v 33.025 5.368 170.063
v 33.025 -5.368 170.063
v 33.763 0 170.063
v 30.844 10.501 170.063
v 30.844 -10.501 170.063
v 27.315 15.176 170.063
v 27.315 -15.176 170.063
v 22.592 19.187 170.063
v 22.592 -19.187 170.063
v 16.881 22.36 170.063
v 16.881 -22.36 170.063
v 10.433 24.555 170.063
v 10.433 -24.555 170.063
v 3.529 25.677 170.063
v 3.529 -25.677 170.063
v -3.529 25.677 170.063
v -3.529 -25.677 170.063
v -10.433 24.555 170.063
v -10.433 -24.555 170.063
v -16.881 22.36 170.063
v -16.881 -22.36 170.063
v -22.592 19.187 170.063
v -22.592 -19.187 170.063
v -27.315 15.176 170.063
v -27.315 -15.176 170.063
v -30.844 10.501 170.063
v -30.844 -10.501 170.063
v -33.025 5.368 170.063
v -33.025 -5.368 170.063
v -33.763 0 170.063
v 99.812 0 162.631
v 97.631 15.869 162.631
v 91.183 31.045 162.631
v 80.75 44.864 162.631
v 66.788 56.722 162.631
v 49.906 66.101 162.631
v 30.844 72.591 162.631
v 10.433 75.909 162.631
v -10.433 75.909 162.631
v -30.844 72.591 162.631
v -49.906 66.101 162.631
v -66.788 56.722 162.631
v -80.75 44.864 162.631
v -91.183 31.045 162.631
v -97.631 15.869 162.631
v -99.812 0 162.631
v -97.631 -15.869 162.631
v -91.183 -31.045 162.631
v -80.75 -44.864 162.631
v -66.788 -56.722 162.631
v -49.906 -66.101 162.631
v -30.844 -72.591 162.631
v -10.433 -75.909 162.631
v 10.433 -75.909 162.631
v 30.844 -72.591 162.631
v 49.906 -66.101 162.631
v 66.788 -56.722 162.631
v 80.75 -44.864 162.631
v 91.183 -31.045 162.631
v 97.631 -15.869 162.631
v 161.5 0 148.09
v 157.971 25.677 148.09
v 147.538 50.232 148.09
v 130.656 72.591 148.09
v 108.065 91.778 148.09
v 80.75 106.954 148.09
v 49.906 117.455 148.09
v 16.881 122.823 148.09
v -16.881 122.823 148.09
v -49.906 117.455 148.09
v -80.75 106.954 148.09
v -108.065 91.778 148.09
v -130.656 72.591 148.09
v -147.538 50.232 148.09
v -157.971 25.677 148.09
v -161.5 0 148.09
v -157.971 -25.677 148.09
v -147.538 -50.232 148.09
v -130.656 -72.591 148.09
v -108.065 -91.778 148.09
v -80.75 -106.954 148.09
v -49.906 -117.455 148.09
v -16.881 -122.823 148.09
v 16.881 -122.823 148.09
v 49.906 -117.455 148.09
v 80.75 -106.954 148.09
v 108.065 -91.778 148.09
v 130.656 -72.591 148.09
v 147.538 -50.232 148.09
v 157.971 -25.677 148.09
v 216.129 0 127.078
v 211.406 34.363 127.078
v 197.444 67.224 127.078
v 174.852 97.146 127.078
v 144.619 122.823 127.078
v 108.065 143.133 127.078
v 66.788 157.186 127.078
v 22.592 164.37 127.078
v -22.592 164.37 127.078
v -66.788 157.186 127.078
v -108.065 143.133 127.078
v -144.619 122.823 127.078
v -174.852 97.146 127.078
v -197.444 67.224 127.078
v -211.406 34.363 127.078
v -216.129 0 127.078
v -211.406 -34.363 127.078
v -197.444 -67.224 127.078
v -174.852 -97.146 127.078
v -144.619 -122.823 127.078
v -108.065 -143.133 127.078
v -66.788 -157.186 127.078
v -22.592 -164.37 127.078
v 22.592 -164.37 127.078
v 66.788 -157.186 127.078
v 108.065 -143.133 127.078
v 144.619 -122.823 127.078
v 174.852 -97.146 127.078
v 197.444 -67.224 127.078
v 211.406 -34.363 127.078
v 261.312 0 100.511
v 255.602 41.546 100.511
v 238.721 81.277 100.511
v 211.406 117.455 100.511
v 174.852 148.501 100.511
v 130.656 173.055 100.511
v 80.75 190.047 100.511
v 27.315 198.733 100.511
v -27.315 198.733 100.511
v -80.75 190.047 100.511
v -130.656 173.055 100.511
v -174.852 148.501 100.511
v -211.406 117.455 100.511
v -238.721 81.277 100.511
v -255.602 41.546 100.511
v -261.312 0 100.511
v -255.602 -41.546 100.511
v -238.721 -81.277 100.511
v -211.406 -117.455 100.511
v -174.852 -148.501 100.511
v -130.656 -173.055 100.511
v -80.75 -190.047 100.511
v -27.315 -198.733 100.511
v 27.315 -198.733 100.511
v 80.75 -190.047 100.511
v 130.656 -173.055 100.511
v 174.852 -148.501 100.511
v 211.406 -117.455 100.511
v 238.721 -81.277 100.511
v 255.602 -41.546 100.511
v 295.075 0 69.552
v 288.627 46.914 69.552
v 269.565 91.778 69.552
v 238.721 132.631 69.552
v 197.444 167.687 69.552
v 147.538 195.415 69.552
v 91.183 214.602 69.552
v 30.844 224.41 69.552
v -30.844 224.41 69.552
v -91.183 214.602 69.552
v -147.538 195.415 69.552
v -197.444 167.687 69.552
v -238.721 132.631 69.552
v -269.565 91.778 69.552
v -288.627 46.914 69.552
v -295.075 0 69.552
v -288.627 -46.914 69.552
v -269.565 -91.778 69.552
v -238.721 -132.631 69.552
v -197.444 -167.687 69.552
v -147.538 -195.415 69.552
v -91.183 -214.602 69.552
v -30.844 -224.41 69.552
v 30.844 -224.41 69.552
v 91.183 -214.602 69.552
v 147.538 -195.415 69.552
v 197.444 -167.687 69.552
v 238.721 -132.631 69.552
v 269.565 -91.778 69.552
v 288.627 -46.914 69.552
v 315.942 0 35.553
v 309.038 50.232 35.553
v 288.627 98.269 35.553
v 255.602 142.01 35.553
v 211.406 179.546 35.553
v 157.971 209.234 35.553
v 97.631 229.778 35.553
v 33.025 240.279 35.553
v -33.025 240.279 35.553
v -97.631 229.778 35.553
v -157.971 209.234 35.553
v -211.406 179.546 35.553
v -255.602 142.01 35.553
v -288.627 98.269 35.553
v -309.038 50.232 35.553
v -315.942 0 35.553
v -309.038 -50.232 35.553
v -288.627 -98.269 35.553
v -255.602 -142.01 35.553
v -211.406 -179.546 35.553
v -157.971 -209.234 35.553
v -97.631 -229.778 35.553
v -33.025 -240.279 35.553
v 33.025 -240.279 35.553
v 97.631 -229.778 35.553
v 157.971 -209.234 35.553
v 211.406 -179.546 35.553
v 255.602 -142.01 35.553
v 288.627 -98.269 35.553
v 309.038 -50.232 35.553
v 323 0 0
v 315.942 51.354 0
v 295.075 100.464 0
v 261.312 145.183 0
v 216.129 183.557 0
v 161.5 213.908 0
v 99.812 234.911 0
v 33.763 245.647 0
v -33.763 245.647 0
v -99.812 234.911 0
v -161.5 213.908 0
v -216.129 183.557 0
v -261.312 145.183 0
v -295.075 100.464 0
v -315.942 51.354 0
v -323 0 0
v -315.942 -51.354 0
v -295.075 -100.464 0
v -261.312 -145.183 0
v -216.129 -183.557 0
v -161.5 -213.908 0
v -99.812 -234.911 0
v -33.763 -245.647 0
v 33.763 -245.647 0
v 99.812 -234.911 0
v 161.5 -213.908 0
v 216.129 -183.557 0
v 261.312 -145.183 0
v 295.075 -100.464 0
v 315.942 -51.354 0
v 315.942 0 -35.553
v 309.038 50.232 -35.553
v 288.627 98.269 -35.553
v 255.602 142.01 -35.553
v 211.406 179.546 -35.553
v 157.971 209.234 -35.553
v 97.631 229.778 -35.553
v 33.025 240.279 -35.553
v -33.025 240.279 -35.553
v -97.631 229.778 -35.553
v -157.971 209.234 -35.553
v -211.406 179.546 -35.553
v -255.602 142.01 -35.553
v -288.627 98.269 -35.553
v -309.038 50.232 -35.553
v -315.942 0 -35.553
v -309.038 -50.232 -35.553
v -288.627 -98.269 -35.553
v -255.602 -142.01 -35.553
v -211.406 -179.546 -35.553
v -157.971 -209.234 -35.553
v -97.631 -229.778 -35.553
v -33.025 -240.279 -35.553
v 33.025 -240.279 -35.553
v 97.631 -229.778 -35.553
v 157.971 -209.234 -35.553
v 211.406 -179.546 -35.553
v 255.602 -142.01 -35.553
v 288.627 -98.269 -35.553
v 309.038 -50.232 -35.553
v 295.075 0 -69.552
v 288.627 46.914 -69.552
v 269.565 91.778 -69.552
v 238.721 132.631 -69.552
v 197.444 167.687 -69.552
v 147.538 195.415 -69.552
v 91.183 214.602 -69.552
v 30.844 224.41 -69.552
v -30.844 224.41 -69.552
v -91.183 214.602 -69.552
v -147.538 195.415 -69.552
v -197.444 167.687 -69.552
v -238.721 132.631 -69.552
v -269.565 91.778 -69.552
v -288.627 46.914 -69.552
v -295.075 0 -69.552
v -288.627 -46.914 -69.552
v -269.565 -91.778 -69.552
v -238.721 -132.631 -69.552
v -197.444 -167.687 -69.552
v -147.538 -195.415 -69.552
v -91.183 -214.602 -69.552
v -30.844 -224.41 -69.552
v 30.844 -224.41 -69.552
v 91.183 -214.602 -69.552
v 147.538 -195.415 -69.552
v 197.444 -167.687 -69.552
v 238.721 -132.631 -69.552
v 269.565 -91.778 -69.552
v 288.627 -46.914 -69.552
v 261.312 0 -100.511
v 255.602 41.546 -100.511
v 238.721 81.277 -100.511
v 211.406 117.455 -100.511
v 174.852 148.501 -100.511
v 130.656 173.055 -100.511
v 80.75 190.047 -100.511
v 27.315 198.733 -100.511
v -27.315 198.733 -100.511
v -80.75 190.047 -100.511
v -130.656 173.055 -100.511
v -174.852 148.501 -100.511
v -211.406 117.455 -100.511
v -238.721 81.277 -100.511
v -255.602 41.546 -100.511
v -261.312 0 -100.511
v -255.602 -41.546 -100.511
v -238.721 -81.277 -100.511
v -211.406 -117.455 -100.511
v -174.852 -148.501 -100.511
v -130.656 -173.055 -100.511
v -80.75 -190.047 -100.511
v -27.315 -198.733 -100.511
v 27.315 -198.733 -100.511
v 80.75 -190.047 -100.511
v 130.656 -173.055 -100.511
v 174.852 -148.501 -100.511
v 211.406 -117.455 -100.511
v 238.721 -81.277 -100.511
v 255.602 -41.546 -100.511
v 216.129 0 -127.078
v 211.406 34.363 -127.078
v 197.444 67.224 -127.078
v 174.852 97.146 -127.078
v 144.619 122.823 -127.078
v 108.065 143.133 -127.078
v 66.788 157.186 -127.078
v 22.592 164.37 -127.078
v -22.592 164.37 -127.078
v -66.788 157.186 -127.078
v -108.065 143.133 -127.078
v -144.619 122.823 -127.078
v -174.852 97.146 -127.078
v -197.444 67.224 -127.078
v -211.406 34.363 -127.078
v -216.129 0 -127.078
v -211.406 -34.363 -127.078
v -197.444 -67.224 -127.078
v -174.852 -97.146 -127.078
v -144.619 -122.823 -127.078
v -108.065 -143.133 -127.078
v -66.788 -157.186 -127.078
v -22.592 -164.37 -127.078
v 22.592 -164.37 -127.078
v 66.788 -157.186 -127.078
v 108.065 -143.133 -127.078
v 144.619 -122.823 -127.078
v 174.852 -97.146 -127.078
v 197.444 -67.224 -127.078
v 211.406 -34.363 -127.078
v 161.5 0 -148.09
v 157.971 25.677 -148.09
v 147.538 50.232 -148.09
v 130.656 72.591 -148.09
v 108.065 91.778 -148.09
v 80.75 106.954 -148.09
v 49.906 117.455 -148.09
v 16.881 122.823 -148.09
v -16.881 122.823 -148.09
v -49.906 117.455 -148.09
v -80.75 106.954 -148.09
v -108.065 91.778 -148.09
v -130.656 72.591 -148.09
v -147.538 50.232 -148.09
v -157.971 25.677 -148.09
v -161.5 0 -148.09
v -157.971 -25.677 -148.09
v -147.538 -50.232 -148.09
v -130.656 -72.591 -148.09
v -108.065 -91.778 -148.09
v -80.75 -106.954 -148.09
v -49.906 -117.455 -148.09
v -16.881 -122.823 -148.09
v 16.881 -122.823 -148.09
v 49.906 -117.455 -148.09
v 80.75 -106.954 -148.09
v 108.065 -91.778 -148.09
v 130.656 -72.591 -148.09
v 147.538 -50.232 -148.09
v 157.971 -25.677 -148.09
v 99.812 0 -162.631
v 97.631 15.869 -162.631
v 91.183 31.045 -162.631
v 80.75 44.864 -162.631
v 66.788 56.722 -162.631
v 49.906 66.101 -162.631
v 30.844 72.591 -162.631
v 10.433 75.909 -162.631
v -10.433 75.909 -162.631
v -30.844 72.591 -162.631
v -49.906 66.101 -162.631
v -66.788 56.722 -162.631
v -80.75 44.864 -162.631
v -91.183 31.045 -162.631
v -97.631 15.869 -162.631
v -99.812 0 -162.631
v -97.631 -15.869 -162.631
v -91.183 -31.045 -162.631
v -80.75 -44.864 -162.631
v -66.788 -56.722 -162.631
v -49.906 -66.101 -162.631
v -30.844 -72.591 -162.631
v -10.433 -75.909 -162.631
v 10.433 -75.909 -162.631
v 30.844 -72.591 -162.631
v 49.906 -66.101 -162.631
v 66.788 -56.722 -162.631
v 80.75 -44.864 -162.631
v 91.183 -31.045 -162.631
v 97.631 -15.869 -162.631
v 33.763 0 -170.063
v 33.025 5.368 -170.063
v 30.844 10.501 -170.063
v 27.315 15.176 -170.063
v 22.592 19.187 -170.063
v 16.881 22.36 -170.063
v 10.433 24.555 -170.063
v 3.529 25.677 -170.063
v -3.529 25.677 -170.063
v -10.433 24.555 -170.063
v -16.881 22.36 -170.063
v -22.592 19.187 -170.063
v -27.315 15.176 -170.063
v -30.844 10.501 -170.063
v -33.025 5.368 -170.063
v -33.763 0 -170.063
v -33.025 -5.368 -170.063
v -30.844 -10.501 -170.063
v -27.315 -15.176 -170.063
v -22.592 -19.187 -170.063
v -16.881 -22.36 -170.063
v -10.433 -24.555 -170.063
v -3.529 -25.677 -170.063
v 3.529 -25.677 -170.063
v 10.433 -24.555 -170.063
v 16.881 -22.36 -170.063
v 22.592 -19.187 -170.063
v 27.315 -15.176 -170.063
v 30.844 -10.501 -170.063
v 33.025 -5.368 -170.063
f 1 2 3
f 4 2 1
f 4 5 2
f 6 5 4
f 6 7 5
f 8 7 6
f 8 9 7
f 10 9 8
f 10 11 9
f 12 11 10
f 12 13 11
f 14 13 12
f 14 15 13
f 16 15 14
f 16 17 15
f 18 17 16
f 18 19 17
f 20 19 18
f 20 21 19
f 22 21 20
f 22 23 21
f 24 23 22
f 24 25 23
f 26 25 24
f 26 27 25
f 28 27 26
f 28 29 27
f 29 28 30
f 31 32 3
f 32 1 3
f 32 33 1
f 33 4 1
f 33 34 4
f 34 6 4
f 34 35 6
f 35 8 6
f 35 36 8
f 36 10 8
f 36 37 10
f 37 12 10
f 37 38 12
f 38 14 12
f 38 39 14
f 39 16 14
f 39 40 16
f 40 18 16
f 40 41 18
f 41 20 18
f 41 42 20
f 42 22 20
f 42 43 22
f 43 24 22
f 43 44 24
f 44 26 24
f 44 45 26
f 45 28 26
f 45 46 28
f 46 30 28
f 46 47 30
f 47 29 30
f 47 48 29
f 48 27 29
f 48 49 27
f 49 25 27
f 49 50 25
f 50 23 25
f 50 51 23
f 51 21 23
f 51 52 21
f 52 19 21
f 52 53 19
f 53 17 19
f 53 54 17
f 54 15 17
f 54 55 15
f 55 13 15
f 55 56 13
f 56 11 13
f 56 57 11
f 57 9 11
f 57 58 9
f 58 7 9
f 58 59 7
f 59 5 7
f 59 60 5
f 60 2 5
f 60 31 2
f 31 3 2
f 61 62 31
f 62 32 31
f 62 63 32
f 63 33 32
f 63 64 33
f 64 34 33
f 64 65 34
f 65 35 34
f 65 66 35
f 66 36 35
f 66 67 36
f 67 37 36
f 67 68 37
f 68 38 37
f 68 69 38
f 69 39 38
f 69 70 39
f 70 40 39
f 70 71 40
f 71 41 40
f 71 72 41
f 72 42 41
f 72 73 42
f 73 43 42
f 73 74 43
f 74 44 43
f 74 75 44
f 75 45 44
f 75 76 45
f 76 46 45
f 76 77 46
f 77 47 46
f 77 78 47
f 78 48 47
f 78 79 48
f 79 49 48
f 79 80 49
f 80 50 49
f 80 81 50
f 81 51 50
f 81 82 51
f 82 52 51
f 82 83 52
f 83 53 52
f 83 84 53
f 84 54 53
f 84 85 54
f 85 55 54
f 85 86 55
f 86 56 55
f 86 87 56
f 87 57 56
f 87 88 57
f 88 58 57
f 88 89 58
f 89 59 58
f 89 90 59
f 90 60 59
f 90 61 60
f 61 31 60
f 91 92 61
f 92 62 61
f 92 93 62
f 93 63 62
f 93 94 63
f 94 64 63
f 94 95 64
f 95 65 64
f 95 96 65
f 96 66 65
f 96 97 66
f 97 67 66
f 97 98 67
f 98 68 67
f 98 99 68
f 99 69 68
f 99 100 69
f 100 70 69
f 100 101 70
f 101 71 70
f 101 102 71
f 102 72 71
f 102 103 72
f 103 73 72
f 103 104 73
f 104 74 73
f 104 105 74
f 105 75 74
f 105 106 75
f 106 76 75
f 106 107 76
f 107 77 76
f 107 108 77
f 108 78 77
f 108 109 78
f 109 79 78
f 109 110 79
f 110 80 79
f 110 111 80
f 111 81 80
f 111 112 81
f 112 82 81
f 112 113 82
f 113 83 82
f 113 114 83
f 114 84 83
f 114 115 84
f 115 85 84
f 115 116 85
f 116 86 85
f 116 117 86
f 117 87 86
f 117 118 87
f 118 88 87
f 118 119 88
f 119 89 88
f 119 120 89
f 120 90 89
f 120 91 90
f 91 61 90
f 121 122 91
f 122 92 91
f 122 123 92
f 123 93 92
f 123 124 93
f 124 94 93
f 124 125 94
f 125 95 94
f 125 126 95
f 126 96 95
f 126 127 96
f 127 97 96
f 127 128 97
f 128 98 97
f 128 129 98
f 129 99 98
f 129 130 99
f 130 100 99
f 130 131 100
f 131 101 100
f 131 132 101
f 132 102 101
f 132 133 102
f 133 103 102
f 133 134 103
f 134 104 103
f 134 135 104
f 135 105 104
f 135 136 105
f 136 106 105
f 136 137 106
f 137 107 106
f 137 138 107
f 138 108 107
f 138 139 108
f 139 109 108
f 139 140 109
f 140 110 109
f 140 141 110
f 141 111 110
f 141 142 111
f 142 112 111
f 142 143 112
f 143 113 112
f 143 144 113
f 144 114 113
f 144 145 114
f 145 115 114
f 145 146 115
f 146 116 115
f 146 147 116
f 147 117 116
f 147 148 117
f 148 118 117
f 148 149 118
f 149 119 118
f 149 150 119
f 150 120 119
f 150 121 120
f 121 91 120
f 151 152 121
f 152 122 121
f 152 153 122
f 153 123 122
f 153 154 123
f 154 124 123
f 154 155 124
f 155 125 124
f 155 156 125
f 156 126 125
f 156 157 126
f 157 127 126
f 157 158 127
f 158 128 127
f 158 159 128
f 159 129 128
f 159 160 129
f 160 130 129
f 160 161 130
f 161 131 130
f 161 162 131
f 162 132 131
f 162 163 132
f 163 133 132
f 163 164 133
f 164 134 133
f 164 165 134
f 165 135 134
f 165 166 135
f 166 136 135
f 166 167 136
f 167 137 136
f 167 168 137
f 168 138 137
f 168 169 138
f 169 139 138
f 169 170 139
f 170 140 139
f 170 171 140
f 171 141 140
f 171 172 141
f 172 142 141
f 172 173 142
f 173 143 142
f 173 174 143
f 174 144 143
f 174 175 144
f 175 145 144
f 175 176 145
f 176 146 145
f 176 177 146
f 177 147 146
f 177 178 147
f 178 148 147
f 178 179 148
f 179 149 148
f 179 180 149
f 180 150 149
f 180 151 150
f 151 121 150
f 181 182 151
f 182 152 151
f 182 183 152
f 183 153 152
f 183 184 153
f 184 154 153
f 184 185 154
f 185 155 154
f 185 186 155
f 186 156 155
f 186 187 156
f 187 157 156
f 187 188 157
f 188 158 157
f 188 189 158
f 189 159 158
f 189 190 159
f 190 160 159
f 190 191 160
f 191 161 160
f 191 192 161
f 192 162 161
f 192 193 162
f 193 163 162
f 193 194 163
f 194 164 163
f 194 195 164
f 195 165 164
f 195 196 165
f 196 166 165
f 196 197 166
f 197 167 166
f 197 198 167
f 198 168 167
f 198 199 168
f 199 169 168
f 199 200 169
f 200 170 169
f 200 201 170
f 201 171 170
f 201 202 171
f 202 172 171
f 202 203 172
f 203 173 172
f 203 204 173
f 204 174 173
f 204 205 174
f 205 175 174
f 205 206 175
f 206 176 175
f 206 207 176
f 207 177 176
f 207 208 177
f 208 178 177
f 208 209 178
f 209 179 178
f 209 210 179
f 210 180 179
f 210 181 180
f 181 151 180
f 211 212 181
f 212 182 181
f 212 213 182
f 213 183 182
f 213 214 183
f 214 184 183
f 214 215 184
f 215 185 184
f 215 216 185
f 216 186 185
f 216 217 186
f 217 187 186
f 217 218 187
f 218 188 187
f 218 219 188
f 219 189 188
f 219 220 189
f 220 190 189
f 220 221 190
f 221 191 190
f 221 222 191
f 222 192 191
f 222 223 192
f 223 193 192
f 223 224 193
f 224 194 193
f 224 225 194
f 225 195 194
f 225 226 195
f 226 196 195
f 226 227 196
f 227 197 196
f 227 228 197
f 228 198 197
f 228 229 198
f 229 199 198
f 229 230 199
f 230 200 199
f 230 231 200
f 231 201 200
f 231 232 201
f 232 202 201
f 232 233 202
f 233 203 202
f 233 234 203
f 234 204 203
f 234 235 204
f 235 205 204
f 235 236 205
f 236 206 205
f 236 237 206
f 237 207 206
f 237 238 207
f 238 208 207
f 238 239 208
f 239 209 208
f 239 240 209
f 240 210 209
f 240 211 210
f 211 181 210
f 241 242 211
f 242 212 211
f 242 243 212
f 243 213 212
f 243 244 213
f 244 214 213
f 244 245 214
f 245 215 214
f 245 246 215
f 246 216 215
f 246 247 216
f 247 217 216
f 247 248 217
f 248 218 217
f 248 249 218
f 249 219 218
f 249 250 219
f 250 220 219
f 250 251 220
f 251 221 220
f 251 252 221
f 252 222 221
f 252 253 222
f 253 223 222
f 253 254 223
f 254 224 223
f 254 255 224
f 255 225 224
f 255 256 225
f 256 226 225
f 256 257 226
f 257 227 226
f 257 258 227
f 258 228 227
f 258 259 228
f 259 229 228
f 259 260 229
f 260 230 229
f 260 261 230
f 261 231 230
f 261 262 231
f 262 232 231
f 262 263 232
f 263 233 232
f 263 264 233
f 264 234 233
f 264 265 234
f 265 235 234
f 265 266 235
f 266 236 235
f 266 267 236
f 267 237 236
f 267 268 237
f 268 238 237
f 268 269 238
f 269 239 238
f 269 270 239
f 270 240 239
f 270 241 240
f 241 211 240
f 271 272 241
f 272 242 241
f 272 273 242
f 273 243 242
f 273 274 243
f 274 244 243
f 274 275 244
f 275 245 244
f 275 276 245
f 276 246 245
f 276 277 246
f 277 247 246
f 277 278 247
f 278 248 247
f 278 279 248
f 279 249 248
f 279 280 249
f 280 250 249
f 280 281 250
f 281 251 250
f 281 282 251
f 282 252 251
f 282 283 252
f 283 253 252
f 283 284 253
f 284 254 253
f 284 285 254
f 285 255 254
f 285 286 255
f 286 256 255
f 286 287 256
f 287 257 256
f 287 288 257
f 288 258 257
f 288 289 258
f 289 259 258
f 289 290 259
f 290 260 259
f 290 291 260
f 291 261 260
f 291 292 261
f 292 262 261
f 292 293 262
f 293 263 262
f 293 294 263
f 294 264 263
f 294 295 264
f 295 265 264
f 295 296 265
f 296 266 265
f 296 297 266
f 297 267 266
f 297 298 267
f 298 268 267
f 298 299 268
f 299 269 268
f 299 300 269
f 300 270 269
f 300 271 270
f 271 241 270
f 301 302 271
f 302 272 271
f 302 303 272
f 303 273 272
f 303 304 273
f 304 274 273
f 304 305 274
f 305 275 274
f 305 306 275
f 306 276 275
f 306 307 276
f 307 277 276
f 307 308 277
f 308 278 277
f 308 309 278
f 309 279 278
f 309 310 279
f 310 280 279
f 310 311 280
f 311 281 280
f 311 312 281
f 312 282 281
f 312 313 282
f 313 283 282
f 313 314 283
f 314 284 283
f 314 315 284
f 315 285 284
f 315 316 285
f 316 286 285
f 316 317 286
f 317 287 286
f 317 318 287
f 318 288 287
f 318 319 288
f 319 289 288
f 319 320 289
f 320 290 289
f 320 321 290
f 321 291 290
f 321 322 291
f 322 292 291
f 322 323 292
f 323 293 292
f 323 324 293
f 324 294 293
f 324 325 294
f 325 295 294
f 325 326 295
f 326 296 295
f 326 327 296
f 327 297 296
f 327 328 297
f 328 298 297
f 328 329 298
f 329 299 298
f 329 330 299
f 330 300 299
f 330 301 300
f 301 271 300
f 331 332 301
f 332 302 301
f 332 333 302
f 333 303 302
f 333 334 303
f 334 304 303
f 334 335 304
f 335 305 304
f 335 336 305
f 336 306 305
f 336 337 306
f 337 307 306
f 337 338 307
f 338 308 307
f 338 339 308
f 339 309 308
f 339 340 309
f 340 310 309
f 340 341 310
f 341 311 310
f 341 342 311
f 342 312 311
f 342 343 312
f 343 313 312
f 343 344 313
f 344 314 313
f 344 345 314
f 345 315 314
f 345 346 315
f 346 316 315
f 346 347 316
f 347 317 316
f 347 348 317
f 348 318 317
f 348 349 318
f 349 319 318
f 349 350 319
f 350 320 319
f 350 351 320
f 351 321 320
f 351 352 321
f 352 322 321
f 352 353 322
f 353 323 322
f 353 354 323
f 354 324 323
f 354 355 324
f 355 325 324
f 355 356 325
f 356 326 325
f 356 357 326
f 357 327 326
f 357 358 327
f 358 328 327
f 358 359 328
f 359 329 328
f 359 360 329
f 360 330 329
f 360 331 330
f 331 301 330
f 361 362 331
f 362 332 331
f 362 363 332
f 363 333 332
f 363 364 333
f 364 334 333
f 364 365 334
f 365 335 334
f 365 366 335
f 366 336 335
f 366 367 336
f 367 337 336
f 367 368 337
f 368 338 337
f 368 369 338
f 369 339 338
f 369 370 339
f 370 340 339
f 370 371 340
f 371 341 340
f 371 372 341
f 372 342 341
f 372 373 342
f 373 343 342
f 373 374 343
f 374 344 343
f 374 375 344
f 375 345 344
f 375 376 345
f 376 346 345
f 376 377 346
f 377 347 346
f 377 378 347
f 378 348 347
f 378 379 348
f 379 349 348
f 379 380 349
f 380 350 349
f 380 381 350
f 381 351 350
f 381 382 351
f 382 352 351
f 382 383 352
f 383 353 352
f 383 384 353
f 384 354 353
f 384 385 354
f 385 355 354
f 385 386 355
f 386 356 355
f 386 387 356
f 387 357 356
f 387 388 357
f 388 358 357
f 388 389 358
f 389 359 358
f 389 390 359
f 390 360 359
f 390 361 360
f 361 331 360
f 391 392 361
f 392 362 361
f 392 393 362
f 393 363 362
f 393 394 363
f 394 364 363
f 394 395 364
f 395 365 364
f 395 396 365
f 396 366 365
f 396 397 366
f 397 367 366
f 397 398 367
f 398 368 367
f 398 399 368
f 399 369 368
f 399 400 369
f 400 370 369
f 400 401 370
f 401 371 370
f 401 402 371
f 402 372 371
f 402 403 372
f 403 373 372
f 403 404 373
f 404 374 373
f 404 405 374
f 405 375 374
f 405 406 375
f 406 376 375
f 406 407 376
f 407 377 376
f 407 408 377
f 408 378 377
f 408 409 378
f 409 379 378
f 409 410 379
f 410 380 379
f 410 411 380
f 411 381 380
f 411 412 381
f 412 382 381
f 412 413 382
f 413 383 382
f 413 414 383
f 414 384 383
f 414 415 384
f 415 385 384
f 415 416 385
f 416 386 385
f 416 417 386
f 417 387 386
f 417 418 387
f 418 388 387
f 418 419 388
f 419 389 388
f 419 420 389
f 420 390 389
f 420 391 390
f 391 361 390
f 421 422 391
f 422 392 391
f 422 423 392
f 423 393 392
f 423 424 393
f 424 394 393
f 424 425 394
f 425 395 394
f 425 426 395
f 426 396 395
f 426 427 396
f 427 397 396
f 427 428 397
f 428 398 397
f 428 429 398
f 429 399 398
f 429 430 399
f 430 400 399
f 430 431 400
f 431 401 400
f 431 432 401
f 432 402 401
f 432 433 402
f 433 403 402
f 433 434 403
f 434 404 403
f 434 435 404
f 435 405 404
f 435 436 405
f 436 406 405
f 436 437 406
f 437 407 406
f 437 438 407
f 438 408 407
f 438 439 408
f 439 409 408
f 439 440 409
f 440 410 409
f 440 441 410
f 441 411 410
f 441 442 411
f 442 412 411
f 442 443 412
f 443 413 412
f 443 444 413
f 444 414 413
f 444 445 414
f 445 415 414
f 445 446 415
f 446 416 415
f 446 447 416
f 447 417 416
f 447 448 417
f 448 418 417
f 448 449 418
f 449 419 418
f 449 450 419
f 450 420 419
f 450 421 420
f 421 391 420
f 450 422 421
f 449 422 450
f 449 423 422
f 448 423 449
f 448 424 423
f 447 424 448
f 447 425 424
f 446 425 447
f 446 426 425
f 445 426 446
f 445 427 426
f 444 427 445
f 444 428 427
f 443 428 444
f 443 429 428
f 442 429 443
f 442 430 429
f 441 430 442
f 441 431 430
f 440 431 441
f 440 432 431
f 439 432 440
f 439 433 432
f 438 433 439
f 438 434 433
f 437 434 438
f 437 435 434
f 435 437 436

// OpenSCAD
// Generated by SolidPython 1.0.1 on 2020-07-29 00:46:53


scale(v = [17, 13, 9]) {
	sphere(r = 19);
}
/***********************************************
*********      SolidPython code:      **********
************************************************
 
# import packages: SolidPython
from solid import *
from solid.utils import *
from itertools import chain, combinations, permutations


class Resize:

    def __init__(self, scad_file):
        self.scad_file = scad_file
        #self.scad_file = import_scad(scad_file)
        # cone/cylinder param:
        self.r1 = 0
        self.r2 = 0
        self.h = 0
        # rectangular prism param:
        self.w = 0
        self.l = 0
        # ellipse param:
        self.r = 0

    # import OpenScad code (file name corresponds to shape)


    # classify shape + parameters
    def assign(self, param1, param2, param3):
        if self.scad_file == 'cone.scad':
            self.r1 = param1
            self.r2 = param2
            self.h = param3
        elif self.scad_file == 'cylinder.scad':
            self.r1 = param1
            self.r2 = param2
            self.h = param3
        elif self.scad_file == 'rectangularPrism.scad':
            self.h = param1
            self.l = param2
            self.w = param3
        else:
            self.r = param1
            self.h = param2

    # resize parameters
    def iterate(self):
        x = range(3, 20, 2)
        i = 1
        if self.scad_file == 'cone.scad':
            tempList = list(permutations(x, 2))
            for temp in tempList:
                param1 = temp[0]
                param2 = temp[1]
                filepath = 'produced_scad_files/' + 'cone' + str(param1) + '_' + str(param2) + '_' + '.scad'
                scad_render_to_file(cylinder(h=param1, r1=param2, r2=0), filepath)

        elif self.scad_file == 'cylinder.scad':
            tempList = list(permutations(x, 3))
            for temp in tempList:
                param1 = temp[0]
                param2 = temp[1]
                filepath = 'produced_scad_files/' + 'cylinder' + str(param1) + '_' + str(param2) + '_' + '.scad'
                scad_render_to_file(cylinder(h=param1, r1=param2, r2=param2), filepath)

        elif self.scad_file == 'rectangularPrism.scad':
            tempList = list(permutations(x, 3))
            for temp in tempList:
                param1 = temp[0]
                param2 = temp[1]
                param3 = temp[2]
                filepath = 'produced_scad_files/' + 'rectangularPrism' + str(param1) + '_' + str(param2) + '_' + str(
                    param3) + '.scad'
                scad_render_to_file(cube(size=(param1, param2, param3)), filepath)

        elif self.scad_file == 'ellipse.scad':
            tempList = list(permutations(x, 4))
            for temp in tempList:
                param1 = temp[0]
                param2 = temp[1]
                param3 = temp[2]
                param4 = temp[3]
                filepath = 'produced_scad_files/' + 'ellipse' + str(param1) + '_' + str(param2) + '_' + str(param3) + '_' + str(param4) + '.scad'
                scad_render_to_file(scale([param1, param2, param3])(sphere(r=param4)), filepath)

    def render_to_scadfile(self):
        scad_render_to_file(scad, 'example.scad') 
 
************************************************/
